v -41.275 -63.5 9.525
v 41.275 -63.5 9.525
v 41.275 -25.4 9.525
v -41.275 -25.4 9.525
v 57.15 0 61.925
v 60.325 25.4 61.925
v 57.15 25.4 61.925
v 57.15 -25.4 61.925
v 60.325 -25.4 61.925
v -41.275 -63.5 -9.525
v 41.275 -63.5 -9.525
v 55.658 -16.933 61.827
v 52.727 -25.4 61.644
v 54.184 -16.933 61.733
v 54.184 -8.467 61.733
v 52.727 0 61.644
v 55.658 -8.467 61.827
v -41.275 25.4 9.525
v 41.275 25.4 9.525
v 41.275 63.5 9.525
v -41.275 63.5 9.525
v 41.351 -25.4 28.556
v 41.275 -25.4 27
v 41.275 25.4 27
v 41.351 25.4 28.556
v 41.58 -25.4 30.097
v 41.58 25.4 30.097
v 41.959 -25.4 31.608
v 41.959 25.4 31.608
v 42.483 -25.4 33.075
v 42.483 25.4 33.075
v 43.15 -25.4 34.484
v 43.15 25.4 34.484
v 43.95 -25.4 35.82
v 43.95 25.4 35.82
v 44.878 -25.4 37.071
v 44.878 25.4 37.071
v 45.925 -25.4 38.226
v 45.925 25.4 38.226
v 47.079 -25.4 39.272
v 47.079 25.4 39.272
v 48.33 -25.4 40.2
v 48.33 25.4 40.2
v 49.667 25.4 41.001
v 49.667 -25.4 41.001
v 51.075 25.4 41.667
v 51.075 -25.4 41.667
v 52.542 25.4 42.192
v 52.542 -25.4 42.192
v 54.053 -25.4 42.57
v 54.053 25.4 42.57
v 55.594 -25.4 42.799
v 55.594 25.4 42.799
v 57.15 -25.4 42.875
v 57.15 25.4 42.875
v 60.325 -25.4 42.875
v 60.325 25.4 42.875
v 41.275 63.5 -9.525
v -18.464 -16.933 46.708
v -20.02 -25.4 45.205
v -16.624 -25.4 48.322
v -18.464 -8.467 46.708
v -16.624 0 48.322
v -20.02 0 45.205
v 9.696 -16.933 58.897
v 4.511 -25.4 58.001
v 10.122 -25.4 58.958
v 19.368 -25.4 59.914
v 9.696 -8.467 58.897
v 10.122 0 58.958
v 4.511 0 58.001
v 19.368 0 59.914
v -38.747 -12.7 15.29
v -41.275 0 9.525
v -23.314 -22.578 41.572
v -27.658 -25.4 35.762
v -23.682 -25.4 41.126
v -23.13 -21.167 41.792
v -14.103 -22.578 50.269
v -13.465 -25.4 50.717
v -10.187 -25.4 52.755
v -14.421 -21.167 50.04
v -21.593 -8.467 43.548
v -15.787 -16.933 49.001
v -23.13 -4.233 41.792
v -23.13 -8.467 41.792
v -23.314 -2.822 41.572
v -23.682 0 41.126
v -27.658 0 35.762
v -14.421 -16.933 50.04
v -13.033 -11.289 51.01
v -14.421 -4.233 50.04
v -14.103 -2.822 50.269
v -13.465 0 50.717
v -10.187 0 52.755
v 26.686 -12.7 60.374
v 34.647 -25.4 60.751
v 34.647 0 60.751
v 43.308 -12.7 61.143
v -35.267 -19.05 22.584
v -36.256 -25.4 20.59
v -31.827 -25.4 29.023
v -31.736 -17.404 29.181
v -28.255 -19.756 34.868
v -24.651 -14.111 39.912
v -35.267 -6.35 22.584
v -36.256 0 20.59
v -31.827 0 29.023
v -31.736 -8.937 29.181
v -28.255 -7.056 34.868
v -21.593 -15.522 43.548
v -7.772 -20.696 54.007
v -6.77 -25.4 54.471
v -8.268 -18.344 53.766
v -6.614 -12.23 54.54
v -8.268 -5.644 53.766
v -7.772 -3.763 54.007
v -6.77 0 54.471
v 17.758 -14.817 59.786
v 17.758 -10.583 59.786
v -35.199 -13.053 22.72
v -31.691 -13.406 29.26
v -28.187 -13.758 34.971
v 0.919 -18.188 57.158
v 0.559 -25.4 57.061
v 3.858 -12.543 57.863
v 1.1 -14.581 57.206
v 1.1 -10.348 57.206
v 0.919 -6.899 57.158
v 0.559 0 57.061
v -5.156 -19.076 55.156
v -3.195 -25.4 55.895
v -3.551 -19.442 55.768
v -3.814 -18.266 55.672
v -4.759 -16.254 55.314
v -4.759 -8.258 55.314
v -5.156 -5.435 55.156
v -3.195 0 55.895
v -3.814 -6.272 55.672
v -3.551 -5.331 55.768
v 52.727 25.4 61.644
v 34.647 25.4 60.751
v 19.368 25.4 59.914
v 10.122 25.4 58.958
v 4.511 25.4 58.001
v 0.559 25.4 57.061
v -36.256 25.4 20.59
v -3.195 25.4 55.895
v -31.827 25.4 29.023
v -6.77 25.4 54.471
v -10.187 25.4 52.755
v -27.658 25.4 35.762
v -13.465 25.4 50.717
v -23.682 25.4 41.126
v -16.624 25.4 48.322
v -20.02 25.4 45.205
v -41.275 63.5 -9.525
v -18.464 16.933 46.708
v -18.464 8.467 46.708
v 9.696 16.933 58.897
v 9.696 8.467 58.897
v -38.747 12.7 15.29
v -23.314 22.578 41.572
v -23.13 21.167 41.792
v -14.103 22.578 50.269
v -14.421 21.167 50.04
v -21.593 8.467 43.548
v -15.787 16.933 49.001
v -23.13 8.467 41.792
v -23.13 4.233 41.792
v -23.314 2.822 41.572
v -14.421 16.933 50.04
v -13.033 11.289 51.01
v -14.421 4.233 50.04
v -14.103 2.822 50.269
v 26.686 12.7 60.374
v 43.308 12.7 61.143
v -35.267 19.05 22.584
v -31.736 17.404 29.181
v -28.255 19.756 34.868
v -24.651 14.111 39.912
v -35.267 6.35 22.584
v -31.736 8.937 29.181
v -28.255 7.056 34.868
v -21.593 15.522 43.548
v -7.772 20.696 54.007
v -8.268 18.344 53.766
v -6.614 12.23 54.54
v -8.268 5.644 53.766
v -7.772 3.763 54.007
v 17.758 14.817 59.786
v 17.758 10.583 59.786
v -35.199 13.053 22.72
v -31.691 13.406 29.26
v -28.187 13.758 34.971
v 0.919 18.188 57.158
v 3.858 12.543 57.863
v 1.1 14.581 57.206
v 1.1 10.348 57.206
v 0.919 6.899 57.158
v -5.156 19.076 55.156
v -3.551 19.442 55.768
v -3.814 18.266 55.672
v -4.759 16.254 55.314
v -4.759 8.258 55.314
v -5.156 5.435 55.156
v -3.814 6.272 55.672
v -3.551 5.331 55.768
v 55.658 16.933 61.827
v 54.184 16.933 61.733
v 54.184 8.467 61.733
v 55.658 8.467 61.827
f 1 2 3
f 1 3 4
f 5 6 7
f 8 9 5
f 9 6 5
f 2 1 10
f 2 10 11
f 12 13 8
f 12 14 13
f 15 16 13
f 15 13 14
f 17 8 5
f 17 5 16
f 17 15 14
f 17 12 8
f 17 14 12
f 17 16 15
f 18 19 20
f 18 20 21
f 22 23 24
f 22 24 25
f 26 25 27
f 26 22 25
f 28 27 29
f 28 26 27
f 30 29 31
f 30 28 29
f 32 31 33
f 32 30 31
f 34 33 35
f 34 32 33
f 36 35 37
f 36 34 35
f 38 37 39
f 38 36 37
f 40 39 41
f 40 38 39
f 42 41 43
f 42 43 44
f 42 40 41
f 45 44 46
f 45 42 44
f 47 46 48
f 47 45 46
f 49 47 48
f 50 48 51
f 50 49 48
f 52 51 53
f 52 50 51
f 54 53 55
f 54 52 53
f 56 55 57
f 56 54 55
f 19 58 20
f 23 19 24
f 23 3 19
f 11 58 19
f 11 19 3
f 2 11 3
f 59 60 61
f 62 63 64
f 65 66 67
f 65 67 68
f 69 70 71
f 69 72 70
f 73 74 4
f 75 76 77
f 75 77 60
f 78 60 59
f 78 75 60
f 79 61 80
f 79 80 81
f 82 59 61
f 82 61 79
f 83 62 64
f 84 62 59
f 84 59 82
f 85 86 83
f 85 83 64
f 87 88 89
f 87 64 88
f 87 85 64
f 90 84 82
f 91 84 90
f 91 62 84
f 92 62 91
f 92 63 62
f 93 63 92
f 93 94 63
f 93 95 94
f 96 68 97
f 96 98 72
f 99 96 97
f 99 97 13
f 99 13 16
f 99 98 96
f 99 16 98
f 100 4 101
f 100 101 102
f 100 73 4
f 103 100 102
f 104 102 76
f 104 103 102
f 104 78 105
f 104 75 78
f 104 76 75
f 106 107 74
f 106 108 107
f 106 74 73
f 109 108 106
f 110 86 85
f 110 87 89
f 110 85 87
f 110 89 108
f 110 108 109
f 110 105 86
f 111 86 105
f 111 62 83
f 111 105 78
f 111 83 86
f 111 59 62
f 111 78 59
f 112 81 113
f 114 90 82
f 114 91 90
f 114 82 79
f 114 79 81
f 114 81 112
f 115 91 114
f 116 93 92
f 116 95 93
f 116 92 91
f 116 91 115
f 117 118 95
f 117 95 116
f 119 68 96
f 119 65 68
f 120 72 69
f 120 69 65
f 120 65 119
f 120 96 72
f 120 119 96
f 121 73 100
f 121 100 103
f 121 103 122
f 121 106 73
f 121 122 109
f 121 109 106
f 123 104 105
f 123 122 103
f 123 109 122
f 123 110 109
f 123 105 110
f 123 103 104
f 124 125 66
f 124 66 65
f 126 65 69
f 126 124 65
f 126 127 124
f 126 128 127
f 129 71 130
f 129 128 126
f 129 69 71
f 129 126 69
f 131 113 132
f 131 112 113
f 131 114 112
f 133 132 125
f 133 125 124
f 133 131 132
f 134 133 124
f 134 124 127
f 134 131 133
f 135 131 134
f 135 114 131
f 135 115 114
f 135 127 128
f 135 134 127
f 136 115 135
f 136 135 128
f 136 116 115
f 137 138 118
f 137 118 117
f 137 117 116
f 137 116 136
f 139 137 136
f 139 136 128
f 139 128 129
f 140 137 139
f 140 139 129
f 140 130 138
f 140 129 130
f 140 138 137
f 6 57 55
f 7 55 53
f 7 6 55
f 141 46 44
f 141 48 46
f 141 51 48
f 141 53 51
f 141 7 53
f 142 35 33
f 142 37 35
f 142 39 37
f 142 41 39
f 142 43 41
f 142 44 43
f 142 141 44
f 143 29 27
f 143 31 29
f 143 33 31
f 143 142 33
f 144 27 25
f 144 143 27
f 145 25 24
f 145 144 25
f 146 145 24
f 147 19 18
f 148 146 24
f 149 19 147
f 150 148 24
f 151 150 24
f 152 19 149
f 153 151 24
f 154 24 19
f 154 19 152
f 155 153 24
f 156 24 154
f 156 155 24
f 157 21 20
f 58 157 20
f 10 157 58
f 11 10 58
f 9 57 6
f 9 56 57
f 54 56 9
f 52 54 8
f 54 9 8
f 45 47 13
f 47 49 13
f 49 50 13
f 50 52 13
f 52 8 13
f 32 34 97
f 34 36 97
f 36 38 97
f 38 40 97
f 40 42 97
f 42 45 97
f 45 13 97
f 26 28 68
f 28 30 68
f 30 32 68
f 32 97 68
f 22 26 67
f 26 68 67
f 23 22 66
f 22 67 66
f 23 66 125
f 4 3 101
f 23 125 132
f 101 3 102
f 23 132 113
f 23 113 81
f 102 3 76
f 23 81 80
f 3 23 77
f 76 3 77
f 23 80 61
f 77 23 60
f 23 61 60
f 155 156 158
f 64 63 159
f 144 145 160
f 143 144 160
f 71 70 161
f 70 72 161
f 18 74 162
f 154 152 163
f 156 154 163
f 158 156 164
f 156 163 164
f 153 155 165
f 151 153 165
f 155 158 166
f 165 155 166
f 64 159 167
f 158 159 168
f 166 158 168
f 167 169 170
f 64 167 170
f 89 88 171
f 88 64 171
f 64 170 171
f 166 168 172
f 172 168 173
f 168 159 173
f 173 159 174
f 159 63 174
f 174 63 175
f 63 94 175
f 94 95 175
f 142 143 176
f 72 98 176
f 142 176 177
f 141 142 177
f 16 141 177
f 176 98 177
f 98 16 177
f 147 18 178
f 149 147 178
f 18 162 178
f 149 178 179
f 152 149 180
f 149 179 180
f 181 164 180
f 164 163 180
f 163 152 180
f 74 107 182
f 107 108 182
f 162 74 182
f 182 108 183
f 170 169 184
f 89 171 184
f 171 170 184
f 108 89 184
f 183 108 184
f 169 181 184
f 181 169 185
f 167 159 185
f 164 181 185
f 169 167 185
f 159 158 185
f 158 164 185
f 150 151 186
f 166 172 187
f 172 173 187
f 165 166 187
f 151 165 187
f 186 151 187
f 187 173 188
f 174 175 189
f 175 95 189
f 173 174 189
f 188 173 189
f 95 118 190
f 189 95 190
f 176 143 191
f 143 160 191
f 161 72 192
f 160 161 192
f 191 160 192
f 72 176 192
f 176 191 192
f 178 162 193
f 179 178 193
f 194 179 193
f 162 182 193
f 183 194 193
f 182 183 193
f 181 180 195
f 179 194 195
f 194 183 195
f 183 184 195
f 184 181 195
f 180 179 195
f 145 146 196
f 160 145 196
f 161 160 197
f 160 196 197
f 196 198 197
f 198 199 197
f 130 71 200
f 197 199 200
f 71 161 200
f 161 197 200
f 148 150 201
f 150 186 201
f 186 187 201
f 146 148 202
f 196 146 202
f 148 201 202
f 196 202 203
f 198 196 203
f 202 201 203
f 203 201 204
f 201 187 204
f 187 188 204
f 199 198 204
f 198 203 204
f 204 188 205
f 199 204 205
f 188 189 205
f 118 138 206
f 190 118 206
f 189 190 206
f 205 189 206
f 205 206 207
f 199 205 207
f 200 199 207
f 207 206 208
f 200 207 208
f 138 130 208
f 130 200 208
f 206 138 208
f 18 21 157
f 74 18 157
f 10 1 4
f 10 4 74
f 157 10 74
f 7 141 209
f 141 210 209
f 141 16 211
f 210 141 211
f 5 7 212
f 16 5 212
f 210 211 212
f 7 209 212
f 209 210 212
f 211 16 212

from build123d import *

# Parameters (mm, degrees)
F1_DEPTH = 63.5
F2_DEPTH = 25.4


with BuildPart() as f1:
    # F0 (on Front) → F1 (new body, symmetric)
    with BuildSketch(Plane.XZ):
        Polygon((22.225, 9.525), (-41.275, 9.525), (-41.275, -9.525), (41.275, -9.525), (41.275, 9.525), align=None)
    extrude(amount=F1_DEPTH, both=True)

    # F0 (on Front) → F2 (join, symmetric)
    with BuildSketch(Plane.XZ):
        with BuildLine():
            add(Edge.make_bspline(
                [(-41.275, 9.525), (-17.963025, 64.389196), (-0.915335, 58.434684), (52.727391, 61.644047)],
                knots=[0, 0, 0, 0, 108.575172, 108.575172, 108.575172, 108.575172], degree=3))
            Line((-41.275, 9.525), (22.225, 9.525))
            Line((22.225, 9.525), (22.225, 27.0002))
            ThreePointArc((22.225, 27.0002), (30.937262, 50.079368), (52.727391, 61.644047))
        make_face()
        with BuildLine():
            Line((22.225, 27.0002), (22.225, 9.525))
            Line((22.225, 9.525), (41.275, 9.525))
            Line((41.275, 9.525), (41.275, 27.0002))
            ThreePointArc((41.275, 27.0002), (45.92468, 38.22552), (57.15, 42.8752))
            Line((57.15, 42.8752), (60.325, 42.8752))
            Line((60.325, 42.8752), (60.325, 61.9252))
            Line((60.325, 61.9252), (57.15, 61.9252))
            add(Edge.make_bspline(
                [(52.727391, 61.644047), (54.174675, 61.730636), (55.648598, 61.823896), (57.15, 61.9252)],
                knots=[108.575172, 108.575172, 108.575172, 108.575172, 111.504536, 111.504536, 111.504536, 111.504536], degree=3))
            ThreePointArc((52.727391, 61.644047), (30.937262, 50.079368), (22.225, 27.0002))
        make_face()
    extrude(amount=F2_DEPTH, both=True)


solid = f1.part
